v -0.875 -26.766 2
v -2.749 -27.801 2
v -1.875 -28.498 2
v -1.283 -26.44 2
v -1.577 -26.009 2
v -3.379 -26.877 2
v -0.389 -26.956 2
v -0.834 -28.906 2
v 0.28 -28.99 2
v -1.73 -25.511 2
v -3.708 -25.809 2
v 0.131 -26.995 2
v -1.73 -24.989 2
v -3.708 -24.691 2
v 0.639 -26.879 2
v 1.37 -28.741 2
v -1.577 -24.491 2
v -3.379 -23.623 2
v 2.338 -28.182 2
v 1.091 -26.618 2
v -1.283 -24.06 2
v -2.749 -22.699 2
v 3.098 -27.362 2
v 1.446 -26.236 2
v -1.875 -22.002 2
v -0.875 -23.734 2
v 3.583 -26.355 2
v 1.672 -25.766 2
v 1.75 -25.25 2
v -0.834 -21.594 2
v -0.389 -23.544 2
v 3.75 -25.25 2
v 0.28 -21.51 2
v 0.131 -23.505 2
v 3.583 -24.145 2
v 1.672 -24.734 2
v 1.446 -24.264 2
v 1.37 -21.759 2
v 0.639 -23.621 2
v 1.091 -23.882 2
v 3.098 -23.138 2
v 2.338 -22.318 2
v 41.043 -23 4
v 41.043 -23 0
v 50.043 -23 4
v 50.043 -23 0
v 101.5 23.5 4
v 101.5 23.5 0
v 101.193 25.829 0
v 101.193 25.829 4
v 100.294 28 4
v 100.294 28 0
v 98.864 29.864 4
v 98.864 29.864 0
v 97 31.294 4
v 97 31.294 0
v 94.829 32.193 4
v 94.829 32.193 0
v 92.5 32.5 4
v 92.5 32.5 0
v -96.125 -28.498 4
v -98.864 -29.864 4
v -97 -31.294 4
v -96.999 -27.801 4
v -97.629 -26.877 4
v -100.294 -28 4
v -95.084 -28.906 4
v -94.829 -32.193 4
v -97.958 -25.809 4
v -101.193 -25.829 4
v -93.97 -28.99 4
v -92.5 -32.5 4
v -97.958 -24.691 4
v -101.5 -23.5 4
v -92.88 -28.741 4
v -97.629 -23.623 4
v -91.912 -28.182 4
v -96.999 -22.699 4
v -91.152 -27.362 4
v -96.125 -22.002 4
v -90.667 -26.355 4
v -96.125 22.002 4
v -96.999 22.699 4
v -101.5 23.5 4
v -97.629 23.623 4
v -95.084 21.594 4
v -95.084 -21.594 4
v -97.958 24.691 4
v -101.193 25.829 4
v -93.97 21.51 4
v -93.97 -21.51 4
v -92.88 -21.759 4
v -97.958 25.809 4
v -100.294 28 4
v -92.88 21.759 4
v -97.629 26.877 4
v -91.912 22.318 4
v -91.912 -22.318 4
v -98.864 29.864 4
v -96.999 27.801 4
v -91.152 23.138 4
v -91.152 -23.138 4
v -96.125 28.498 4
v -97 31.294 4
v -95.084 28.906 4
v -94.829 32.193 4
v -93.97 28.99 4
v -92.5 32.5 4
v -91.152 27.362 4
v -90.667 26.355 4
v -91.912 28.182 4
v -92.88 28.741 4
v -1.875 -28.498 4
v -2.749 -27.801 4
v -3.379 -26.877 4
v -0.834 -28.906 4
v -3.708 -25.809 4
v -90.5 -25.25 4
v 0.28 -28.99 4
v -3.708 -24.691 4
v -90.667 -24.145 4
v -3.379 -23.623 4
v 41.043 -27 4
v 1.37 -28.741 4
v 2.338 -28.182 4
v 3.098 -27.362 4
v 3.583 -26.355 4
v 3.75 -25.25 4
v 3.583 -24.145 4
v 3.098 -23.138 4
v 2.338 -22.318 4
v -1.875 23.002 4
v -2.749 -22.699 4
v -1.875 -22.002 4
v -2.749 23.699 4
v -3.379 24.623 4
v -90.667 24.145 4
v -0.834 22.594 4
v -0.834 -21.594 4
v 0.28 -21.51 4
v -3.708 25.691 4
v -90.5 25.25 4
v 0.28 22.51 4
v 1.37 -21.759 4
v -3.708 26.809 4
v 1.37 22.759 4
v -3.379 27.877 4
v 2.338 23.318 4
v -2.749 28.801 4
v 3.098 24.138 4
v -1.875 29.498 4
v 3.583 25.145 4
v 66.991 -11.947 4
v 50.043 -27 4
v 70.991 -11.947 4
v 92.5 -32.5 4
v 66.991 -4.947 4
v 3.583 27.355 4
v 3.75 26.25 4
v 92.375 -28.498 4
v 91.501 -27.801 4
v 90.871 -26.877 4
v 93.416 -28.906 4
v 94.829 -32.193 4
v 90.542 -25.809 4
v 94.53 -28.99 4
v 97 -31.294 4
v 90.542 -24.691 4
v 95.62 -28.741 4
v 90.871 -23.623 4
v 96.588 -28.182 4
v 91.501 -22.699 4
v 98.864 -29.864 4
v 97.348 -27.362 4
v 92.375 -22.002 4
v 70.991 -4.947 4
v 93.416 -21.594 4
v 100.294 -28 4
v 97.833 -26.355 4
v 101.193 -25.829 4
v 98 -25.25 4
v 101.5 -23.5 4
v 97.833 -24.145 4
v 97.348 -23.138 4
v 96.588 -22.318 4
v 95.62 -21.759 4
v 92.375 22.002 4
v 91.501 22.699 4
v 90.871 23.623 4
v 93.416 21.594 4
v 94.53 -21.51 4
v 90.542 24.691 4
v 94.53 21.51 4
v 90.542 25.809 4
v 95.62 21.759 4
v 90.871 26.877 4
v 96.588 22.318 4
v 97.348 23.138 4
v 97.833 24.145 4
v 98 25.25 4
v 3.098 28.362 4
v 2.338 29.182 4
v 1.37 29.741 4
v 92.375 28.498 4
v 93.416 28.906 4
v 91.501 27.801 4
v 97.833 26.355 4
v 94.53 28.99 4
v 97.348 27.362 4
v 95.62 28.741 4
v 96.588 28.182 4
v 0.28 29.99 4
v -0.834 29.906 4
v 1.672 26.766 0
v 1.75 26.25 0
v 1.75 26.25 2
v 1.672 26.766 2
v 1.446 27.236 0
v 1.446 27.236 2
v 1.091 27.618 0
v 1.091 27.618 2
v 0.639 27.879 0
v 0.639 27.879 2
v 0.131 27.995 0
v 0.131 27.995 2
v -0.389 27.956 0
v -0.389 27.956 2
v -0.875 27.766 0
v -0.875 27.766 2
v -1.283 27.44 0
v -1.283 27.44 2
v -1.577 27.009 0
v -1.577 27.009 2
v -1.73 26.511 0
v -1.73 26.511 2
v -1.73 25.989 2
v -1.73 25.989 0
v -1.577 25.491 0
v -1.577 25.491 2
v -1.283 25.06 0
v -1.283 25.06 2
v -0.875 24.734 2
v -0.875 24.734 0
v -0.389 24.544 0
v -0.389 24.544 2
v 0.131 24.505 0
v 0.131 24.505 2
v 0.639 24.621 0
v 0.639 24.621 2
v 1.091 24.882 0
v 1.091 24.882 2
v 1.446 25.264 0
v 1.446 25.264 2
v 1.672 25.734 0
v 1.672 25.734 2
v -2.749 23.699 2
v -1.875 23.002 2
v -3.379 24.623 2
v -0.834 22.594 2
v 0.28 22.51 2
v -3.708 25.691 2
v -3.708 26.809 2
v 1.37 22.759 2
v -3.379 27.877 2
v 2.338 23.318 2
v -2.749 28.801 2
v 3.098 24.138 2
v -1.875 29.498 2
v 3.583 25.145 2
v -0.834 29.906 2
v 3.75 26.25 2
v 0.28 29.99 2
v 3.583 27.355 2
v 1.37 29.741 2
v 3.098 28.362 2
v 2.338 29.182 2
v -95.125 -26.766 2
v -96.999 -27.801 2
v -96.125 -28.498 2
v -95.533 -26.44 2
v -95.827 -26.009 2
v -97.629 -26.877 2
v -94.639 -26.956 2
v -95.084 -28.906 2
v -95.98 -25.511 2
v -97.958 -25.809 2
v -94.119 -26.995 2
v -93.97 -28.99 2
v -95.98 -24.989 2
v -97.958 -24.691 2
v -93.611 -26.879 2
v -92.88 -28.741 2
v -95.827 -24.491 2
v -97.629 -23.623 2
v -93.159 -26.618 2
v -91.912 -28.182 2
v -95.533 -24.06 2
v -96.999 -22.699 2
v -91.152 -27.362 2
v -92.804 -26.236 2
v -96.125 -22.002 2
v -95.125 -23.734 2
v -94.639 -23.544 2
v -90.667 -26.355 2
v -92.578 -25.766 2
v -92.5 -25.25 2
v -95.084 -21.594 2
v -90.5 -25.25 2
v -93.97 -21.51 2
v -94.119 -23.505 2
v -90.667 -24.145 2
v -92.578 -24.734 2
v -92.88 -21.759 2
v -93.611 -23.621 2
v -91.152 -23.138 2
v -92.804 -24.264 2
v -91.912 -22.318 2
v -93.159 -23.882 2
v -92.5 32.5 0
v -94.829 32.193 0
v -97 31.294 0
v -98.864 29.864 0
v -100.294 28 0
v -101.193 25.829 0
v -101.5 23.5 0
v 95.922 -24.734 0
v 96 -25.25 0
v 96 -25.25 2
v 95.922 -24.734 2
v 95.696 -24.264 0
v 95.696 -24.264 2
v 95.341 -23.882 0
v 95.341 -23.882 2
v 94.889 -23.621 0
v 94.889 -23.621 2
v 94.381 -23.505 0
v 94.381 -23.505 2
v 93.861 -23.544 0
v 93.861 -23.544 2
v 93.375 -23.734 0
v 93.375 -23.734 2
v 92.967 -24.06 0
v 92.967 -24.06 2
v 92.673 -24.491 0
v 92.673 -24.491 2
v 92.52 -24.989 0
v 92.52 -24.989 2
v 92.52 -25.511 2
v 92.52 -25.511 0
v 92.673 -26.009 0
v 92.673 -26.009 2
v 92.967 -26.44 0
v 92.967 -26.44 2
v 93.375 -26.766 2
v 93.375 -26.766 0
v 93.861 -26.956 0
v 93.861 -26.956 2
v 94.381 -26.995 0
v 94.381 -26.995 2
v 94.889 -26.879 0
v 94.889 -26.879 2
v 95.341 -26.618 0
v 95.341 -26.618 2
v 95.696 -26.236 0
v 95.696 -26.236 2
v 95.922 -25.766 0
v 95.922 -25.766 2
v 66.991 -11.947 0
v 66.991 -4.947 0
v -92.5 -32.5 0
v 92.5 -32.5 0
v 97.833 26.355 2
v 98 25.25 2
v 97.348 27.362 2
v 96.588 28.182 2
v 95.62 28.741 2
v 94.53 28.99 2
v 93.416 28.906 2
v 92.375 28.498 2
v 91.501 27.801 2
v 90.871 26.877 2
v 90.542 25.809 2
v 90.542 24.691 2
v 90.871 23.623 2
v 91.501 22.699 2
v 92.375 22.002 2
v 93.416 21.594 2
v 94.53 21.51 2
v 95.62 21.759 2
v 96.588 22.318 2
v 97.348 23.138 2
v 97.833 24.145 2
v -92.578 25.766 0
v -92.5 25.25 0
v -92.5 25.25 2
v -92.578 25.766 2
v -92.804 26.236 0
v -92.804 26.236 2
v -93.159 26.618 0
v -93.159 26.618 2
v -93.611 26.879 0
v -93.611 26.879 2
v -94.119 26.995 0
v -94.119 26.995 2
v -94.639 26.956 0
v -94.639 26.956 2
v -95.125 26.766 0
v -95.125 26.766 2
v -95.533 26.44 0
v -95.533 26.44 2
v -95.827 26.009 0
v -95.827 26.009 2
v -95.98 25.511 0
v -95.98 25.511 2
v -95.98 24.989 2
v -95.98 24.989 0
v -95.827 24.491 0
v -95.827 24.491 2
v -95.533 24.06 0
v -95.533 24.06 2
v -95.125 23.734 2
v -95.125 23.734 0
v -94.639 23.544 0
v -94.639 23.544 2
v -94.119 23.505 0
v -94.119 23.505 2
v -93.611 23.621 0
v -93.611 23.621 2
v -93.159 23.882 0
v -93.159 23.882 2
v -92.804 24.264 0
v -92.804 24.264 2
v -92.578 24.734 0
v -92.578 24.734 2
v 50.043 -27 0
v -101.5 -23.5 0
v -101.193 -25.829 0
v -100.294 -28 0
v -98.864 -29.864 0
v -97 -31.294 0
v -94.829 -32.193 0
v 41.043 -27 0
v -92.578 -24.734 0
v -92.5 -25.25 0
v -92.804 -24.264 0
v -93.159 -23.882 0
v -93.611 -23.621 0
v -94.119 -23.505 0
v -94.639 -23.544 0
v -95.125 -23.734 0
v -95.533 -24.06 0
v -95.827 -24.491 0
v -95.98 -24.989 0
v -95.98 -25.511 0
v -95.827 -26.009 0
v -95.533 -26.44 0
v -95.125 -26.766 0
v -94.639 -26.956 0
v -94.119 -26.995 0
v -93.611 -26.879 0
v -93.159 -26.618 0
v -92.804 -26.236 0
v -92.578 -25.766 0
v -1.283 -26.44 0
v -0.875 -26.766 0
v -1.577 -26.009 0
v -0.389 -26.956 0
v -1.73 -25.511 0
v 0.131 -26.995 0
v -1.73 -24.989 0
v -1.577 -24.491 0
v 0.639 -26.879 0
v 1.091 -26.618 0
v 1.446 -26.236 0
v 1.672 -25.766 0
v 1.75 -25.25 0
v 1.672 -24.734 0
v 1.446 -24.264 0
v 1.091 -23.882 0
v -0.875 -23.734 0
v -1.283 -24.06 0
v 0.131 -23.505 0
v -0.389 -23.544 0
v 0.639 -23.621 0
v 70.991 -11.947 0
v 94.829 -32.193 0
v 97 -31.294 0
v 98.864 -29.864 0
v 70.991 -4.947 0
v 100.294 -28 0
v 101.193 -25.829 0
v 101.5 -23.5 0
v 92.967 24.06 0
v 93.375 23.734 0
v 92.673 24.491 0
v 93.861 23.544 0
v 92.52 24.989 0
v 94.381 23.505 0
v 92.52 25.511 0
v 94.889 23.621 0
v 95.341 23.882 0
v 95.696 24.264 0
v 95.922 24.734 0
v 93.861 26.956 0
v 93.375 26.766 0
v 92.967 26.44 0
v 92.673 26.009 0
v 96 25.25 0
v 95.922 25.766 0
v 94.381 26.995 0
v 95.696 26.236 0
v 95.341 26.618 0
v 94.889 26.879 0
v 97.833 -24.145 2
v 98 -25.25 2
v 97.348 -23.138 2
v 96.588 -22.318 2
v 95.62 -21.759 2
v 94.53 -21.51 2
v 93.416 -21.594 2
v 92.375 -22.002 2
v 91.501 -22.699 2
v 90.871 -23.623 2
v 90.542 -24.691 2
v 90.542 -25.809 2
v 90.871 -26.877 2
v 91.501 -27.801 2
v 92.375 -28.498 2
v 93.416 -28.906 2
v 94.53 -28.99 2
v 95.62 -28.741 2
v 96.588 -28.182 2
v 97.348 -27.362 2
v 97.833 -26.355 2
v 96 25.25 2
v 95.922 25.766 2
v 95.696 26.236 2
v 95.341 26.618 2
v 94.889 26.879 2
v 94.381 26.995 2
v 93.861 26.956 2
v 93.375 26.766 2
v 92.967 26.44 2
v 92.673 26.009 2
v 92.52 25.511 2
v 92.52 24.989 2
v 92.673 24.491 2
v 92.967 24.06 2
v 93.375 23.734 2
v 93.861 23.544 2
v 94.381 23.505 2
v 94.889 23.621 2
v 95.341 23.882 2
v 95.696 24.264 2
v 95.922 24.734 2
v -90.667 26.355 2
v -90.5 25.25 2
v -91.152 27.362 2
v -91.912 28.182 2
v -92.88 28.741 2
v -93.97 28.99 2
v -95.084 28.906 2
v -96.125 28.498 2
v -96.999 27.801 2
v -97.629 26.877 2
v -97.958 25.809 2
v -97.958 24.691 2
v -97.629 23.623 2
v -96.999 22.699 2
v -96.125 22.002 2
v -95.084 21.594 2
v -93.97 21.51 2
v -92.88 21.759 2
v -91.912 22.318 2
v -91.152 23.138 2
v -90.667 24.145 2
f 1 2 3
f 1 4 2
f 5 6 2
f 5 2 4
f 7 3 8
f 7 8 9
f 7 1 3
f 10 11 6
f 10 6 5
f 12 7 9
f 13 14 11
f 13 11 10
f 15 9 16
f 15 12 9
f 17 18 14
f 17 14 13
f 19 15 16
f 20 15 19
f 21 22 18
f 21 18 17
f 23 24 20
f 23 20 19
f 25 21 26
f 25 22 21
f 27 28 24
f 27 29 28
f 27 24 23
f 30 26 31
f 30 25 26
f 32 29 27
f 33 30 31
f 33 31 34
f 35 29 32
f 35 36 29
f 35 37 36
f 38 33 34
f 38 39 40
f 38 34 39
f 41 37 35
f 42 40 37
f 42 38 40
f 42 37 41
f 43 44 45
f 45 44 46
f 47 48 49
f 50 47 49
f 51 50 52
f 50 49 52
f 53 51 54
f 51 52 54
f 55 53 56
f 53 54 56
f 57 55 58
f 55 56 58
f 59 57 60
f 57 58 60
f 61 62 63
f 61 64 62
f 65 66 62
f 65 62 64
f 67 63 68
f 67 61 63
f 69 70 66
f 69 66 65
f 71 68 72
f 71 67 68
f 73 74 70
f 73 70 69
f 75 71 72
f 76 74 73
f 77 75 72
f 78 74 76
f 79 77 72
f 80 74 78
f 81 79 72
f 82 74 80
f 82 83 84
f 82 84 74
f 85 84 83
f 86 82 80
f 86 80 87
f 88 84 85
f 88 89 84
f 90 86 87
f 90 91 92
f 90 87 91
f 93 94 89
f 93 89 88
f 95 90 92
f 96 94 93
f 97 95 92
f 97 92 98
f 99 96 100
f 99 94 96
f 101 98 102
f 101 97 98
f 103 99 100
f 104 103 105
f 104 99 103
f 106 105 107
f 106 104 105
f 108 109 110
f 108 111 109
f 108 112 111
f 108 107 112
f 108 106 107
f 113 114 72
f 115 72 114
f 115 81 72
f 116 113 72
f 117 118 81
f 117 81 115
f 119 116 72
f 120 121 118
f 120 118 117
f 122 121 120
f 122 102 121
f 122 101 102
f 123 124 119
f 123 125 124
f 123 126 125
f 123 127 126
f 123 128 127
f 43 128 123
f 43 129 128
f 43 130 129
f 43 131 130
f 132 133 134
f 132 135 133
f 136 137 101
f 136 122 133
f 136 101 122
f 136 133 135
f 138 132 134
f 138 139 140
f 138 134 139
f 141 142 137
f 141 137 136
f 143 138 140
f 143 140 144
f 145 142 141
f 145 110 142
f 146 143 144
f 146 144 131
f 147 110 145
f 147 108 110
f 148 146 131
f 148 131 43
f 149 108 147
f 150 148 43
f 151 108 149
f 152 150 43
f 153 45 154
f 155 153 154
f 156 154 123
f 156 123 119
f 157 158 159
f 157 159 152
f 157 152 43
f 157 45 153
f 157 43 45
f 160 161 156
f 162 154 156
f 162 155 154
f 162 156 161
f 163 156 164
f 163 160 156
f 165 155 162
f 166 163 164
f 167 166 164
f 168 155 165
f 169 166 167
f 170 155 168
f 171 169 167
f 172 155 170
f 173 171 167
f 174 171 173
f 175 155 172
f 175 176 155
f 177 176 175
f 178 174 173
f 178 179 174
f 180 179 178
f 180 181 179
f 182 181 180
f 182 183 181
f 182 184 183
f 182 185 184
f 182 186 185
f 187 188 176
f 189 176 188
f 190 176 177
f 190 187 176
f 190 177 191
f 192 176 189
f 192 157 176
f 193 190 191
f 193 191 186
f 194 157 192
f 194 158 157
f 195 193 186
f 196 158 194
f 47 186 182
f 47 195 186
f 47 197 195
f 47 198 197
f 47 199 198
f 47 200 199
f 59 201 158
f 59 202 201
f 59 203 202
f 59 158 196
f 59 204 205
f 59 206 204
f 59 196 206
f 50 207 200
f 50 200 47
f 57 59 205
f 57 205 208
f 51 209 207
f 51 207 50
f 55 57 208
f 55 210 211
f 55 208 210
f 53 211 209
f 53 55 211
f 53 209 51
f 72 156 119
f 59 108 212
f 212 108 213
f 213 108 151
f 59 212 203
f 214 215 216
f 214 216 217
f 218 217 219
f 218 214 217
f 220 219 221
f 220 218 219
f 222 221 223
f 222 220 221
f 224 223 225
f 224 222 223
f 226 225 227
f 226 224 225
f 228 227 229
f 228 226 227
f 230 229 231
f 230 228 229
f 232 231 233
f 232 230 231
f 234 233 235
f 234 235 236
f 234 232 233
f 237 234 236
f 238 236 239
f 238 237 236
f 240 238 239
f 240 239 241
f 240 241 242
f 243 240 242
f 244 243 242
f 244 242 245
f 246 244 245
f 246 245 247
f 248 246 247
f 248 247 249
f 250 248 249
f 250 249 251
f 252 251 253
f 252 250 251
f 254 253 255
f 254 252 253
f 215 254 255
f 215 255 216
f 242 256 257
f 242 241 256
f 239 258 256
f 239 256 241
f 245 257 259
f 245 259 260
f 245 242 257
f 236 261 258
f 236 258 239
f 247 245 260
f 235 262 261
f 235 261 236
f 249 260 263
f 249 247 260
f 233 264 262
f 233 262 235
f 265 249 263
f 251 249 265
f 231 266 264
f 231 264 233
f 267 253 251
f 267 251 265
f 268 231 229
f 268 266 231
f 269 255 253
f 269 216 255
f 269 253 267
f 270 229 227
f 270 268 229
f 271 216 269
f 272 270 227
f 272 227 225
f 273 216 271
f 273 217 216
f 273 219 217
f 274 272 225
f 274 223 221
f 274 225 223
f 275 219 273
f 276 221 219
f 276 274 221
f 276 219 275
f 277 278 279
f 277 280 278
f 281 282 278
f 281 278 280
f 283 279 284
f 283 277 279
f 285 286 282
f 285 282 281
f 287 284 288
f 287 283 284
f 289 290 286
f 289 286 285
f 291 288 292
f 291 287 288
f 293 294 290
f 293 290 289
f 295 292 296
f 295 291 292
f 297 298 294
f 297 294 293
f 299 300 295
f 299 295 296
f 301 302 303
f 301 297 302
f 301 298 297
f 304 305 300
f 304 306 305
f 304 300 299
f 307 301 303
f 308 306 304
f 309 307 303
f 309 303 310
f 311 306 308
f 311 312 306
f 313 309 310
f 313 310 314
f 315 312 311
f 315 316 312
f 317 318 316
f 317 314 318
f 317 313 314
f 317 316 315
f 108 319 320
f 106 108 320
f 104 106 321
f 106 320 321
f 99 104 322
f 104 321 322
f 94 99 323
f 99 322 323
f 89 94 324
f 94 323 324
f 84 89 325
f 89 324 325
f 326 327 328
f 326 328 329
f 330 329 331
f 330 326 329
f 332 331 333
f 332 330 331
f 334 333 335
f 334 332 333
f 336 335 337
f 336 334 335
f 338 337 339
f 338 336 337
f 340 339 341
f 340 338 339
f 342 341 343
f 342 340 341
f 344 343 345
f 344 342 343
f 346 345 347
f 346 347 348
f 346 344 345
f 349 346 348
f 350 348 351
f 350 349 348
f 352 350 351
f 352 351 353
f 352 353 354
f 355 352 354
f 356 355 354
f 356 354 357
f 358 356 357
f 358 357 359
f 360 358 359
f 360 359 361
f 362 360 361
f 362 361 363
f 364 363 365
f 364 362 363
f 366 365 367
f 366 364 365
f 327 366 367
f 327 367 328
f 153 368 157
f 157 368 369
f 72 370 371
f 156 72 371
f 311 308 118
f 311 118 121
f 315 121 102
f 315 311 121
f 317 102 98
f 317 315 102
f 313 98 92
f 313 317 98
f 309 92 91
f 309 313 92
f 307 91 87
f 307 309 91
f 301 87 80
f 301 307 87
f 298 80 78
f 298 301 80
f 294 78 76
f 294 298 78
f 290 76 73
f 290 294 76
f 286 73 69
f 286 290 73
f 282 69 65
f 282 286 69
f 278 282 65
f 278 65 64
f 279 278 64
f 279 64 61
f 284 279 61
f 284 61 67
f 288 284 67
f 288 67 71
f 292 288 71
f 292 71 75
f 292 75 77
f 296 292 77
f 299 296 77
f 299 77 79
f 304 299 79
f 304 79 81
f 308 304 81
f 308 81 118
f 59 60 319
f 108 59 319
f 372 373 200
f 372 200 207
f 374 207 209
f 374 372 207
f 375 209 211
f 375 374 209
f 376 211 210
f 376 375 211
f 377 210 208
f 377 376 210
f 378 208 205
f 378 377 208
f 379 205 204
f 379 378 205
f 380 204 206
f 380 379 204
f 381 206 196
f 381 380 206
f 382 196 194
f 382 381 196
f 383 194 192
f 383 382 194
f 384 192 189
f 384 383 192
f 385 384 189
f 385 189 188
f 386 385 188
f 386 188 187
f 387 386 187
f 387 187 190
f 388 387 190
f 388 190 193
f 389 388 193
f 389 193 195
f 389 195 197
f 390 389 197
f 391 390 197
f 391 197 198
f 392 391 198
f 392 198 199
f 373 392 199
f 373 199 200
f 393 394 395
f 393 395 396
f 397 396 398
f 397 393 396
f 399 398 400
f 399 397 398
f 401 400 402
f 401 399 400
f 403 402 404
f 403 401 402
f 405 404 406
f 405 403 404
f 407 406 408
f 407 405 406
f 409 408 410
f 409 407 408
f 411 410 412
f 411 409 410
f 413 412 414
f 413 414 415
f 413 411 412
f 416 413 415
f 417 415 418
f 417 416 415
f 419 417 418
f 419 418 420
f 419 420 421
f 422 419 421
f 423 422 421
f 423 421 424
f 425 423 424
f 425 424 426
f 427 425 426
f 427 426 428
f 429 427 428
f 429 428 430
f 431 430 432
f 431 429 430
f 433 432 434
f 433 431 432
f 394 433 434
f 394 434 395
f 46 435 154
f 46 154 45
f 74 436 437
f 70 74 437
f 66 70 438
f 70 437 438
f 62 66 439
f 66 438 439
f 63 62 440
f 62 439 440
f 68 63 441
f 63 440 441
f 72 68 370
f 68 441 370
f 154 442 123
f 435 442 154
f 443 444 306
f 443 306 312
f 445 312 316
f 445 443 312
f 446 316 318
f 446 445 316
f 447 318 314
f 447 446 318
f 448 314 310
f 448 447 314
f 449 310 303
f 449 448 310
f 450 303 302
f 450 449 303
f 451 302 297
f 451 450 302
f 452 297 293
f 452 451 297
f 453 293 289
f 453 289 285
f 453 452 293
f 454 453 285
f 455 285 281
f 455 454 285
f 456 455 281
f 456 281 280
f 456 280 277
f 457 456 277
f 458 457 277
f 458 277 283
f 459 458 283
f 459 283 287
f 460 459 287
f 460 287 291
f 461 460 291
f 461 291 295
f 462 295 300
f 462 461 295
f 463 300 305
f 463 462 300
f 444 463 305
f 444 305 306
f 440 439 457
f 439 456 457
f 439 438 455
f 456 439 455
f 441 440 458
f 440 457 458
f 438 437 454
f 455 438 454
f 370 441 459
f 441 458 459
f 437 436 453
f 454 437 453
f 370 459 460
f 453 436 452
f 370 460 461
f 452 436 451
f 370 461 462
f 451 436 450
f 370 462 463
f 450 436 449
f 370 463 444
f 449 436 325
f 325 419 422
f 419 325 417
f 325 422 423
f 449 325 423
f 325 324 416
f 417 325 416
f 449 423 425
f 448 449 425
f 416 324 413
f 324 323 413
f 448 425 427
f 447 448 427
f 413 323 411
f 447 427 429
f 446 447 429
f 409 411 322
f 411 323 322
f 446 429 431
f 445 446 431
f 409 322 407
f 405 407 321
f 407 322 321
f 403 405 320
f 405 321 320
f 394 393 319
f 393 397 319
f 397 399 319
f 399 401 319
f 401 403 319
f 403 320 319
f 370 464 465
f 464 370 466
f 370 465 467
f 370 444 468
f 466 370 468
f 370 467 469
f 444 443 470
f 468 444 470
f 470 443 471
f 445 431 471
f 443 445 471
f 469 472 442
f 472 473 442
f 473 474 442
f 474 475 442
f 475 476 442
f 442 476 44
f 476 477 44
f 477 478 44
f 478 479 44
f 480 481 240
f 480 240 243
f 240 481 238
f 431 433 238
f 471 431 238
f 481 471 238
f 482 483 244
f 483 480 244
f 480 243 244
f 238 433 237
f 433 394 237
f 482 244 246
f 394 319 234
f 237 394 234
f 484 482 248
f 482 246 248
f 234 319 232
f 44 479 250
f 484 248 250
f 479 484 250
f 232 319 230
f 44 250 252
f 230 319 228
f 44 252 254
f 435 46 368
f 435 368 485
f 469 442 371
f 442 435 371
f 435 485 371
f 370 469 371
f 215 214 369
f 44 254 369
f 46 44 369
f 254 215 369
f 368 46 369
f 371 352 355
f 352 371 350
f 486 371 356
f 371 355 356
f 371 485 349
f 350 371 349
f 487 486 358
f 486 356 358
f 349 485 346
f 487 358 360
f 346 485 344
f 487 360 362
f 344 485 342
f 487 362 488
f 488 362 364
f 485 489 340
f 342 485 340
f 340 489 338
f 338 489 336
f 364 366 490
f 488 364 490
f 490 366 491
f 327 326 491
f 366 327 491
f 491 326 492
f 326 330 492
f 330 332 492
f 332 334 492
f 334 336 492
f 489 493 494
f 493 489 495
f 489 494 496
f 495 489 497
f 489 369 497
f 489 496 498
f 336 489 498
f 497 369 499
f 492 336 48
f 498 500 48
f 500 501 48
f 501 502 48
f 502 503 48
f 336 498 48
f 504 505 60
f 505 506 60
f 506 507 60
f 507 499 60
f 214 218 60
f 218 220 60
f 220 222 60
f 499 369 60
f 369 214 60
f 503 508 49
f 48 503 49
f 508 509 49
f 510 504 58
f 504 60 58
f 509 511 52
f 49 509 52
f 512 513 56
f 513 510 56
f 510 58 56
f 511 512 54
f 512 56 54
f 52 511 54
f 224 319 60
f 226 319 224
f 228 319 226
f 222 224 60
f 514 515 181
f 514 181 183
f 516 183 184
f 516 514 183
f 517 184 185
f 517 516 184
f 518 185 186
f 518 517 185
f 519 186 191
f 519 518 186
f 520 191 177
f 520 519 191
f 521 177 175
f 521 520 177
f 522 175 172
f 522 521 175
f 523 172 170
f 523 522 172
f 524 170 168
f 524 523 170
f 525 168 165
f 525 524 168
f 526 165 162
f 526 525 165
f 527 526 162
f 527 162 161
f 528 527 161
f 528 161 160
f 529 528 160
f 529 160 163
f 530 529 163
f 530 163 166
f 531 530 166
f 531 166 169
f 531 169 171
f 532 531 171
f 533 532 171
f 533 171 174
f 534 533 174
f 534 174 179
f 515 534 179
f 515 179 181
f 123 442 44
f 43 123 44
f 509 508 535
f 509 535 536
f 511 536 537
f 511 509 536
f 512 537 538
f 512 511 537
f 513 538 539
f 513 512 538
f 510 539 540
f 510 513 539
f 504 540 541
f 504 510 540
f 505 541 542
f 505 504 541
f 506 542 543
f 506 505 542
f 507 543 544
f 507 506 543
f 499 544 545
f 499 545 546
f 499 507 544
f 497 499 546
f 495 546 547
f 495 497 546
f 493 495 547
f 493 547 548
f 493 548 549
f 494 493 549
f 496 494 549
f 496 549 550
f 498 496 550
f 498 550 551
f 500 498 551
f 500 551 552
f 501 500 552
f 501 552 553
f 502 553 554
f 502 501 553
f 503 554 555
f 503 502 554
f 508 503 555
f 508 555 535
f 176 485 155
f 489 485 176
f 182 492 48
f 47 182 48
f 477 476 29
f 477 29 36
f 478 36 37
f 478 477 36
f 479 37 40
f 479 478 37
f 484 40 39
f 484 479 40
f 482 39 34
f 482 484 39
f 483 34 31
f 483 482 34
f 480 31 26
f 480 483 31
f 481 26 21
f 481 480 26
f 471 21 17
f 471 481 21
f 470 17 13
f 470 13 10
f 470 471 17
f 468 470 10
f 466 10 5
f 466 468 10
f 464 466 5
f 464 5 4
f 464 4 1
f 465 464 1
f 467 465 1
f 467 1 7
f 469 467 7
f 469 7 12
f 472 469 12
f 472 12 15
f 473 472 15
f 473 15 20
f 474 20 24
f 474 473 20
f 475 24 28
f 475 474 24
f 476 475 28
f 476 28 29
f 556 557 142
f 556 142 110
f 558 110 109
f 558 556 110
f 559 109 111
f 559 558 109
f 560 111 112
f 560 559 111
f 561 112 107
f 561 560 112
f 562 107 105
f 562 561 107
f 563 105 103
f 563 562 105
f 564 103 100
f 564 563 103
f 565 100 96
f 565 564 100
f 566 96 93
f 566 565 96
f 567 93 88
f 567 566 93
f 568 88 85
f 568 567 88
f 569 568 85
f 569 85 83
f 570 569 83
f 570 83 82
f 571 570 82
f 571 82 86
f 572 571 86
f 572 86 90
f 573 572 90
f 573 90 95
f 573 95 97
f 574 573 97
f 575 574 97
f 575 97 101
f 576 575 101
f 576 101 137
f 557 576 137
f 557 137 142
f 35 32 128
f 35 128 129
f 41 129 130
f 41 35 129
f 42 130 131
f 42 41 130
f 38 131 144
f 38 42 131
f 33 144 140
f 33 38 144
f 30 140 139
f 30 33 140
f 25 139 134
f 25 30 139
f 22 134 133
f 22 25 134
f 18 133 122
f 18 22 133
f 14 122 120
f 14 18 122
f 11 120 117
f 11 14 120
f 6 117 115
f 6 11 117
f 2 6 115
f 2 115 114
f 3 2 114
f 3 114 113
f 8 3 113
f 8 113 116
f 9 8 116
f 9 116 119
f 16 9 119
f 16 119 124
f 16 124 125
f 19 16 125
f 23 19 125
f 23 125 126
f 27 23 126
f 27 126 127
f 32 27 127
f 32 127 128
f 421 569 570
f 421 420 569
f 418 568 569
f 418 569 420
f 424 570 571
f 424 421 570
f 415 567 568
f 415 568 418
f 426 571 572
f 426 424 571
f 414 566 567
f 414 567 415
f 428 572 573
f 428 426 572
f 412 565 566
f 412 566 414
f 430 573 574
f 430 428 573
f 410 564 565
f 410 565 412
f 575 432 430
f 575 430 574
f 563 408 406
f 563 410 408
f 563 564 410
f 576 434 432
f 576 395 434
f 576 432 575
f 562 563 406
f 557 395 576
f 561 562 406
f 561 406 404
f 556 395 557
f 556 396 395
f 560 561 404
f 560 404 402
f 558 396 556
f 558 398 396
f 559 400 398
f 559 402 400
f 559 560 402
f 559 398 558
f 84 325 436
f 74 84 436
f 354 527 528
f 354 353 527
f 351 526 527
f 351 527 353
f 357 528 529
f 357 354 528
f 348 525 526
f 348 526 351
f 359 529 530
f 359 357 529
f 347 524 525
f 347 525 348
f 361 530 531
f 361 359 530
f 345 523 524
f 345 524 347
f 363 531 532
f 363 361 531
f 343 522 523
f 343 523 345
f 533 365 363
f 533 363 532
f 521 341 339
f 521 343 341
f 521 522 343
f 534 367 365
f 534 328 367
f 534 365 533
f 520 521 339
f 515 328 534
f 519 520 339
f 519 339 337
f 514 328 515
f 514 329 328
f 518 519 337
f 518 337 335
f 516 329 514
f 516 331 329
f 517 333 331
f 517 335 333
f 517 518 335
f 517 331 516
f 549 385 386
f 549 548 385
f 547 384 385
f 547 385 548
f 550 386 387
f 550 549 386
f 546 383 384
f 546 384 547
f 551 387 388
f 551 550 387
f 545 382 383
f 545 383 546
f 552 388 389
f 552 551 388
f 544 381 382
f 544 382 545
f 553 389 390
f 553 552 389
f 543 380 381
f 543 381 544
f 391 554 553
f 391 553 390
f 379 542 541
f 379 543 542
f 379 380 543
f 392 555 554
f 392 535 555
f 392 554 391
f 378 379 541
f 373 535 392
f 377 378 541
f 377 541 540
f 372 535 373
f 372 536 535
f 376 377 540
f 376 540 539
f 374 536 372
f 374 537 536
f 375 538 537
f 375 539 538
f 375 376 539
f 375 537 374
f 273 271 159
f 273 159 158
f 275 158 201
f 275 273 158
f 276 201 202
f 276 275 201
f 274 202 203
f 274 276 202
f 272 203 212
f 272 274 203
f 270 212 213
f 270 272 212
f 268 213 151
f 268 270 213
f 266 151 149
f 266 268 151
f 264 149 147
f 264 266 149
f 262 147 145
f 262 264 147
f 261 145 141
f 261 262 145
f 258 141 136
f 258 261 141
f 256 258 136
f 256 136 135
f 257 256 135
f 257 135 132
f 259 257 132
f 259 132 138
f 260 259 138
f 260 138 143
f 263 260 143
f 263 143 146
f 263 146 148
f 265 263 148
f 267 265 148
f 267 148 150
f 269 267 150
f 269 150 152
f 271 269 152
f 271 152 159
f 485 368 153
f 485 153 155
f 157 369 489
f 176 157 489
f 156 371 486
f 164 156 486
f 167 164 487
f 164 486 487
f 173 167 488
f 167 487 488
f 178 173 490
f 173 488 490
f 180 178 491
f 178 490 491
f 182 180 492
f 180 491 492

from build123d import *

# Parameters (mm, degrees)
F0_R     = 3.75
F0_W     = 9
F0_H     = 4
F0_W_2   = 4
F0_H_2   = 7
F1_DEPTH = 4
F0_R_2   = 1.75
F2_DEPTH = 2


with BuildPart() as f1:
    # F0 (on Top) → F1 (new body)
    with BuildSketch(Plane.XY):
        with BuildLine():
            Line((-92.5, -32.5), (92.5, -32.5))
            ThreePointArc((92.5, -32.5), (98.863961, -29.863961), (101.5, -23.5))
            Line((101.5, -23.5), (101.5, 23.5))
            ThreePointArc((101.5, 23.5), (98.863961, 29.863961), (92.5, 32.5))
            Line((92.5, 32.5), (-92.5, 32.5))
            ThreePointArc((-92.5, 32.5), (-98.863961, 29.863961), (-101.5, 23.5))
            Line((-101.5, 23.5), (-101.5, -23.5))
            ThreePointArc((-101.5, -23.5), (-98.863961, -29.863961), (-92.5, -32.5))
        make_face()
        with Locations((-94.25, -25.25)):
            Circle(F0_R, mode=Mode.SUBTRACT)
        with Locations((0, -25.25)):
            Circle(F0_R, mode=Mode.SUBTRACT)
        with Locations((45.54334, -25)):
            Rectangle(F0_W, F0_H, mode=Mode.SUBTRACT)
        with Locations((94.25, -25.25)):
            Circle(F0_R, mode=Mode.SUBTRACT)
        with Locations((68.991225, -8.446518)):
            Rectangle(F0_W_2, F0_H_2, mode=Mode.SUBTRACT)
        with Locations((-94.25, 25.25)):
            Circle(F0_R, mode=Mode.SUBTRACT)
        with Locations((0, 26.25)):
            Circle(F0_R, mode=Mode.SUBTRACT)
        with Locations((94.25, 25.25)):
            Circle(F0_R, mode=Mode.SUBTRACT)
    extrude(amount=F1_DEPTH)

    # F0 (on Top) → F2 (join)
    with BuildSketch(Plane.XY):
        with Locations((94.25, -25.25)):
            Circle(F0_R)
        with Locations((94.25, -25.25)):
            Circle(F0_R_2, mode=Mode.SUBTRACT)
        with Locations((0, -25.25)):
            Circle(F0_R)
        with Locations((0, -25.25)):
            Circle(F0_R_2, mode=Mode.SUBTRACT)
        with Locations((0, 26.25)):
            Circle(F0_R)
        with Locations((0, 26.25)):
            Circle(F0_R_2, mode=Mode.SUBTRACT)
        with Locations((94.25, 25.25)):
            Circle(F0_R)
        with Locations((94.25, 25.25)):
            Circle(F0_R_2, mode=Mode.SUBTRACT)
        with Locations((-94.25, -25.25)):
            Circle(F0_R)
        with Locations((-94.25, -25.25)):
            Circle(F0_R_2, mode=Mode.SUBTRACT)
        with Locations((-94.25, 25.25)):
            Circle(F0_R)
        with Locations((-94.25, 25.25)):
            Circle(F0_R_2, mode=Mode.SUBTRACT)
    extrude(amount=F2_DEPTH)


solid = f1.part
